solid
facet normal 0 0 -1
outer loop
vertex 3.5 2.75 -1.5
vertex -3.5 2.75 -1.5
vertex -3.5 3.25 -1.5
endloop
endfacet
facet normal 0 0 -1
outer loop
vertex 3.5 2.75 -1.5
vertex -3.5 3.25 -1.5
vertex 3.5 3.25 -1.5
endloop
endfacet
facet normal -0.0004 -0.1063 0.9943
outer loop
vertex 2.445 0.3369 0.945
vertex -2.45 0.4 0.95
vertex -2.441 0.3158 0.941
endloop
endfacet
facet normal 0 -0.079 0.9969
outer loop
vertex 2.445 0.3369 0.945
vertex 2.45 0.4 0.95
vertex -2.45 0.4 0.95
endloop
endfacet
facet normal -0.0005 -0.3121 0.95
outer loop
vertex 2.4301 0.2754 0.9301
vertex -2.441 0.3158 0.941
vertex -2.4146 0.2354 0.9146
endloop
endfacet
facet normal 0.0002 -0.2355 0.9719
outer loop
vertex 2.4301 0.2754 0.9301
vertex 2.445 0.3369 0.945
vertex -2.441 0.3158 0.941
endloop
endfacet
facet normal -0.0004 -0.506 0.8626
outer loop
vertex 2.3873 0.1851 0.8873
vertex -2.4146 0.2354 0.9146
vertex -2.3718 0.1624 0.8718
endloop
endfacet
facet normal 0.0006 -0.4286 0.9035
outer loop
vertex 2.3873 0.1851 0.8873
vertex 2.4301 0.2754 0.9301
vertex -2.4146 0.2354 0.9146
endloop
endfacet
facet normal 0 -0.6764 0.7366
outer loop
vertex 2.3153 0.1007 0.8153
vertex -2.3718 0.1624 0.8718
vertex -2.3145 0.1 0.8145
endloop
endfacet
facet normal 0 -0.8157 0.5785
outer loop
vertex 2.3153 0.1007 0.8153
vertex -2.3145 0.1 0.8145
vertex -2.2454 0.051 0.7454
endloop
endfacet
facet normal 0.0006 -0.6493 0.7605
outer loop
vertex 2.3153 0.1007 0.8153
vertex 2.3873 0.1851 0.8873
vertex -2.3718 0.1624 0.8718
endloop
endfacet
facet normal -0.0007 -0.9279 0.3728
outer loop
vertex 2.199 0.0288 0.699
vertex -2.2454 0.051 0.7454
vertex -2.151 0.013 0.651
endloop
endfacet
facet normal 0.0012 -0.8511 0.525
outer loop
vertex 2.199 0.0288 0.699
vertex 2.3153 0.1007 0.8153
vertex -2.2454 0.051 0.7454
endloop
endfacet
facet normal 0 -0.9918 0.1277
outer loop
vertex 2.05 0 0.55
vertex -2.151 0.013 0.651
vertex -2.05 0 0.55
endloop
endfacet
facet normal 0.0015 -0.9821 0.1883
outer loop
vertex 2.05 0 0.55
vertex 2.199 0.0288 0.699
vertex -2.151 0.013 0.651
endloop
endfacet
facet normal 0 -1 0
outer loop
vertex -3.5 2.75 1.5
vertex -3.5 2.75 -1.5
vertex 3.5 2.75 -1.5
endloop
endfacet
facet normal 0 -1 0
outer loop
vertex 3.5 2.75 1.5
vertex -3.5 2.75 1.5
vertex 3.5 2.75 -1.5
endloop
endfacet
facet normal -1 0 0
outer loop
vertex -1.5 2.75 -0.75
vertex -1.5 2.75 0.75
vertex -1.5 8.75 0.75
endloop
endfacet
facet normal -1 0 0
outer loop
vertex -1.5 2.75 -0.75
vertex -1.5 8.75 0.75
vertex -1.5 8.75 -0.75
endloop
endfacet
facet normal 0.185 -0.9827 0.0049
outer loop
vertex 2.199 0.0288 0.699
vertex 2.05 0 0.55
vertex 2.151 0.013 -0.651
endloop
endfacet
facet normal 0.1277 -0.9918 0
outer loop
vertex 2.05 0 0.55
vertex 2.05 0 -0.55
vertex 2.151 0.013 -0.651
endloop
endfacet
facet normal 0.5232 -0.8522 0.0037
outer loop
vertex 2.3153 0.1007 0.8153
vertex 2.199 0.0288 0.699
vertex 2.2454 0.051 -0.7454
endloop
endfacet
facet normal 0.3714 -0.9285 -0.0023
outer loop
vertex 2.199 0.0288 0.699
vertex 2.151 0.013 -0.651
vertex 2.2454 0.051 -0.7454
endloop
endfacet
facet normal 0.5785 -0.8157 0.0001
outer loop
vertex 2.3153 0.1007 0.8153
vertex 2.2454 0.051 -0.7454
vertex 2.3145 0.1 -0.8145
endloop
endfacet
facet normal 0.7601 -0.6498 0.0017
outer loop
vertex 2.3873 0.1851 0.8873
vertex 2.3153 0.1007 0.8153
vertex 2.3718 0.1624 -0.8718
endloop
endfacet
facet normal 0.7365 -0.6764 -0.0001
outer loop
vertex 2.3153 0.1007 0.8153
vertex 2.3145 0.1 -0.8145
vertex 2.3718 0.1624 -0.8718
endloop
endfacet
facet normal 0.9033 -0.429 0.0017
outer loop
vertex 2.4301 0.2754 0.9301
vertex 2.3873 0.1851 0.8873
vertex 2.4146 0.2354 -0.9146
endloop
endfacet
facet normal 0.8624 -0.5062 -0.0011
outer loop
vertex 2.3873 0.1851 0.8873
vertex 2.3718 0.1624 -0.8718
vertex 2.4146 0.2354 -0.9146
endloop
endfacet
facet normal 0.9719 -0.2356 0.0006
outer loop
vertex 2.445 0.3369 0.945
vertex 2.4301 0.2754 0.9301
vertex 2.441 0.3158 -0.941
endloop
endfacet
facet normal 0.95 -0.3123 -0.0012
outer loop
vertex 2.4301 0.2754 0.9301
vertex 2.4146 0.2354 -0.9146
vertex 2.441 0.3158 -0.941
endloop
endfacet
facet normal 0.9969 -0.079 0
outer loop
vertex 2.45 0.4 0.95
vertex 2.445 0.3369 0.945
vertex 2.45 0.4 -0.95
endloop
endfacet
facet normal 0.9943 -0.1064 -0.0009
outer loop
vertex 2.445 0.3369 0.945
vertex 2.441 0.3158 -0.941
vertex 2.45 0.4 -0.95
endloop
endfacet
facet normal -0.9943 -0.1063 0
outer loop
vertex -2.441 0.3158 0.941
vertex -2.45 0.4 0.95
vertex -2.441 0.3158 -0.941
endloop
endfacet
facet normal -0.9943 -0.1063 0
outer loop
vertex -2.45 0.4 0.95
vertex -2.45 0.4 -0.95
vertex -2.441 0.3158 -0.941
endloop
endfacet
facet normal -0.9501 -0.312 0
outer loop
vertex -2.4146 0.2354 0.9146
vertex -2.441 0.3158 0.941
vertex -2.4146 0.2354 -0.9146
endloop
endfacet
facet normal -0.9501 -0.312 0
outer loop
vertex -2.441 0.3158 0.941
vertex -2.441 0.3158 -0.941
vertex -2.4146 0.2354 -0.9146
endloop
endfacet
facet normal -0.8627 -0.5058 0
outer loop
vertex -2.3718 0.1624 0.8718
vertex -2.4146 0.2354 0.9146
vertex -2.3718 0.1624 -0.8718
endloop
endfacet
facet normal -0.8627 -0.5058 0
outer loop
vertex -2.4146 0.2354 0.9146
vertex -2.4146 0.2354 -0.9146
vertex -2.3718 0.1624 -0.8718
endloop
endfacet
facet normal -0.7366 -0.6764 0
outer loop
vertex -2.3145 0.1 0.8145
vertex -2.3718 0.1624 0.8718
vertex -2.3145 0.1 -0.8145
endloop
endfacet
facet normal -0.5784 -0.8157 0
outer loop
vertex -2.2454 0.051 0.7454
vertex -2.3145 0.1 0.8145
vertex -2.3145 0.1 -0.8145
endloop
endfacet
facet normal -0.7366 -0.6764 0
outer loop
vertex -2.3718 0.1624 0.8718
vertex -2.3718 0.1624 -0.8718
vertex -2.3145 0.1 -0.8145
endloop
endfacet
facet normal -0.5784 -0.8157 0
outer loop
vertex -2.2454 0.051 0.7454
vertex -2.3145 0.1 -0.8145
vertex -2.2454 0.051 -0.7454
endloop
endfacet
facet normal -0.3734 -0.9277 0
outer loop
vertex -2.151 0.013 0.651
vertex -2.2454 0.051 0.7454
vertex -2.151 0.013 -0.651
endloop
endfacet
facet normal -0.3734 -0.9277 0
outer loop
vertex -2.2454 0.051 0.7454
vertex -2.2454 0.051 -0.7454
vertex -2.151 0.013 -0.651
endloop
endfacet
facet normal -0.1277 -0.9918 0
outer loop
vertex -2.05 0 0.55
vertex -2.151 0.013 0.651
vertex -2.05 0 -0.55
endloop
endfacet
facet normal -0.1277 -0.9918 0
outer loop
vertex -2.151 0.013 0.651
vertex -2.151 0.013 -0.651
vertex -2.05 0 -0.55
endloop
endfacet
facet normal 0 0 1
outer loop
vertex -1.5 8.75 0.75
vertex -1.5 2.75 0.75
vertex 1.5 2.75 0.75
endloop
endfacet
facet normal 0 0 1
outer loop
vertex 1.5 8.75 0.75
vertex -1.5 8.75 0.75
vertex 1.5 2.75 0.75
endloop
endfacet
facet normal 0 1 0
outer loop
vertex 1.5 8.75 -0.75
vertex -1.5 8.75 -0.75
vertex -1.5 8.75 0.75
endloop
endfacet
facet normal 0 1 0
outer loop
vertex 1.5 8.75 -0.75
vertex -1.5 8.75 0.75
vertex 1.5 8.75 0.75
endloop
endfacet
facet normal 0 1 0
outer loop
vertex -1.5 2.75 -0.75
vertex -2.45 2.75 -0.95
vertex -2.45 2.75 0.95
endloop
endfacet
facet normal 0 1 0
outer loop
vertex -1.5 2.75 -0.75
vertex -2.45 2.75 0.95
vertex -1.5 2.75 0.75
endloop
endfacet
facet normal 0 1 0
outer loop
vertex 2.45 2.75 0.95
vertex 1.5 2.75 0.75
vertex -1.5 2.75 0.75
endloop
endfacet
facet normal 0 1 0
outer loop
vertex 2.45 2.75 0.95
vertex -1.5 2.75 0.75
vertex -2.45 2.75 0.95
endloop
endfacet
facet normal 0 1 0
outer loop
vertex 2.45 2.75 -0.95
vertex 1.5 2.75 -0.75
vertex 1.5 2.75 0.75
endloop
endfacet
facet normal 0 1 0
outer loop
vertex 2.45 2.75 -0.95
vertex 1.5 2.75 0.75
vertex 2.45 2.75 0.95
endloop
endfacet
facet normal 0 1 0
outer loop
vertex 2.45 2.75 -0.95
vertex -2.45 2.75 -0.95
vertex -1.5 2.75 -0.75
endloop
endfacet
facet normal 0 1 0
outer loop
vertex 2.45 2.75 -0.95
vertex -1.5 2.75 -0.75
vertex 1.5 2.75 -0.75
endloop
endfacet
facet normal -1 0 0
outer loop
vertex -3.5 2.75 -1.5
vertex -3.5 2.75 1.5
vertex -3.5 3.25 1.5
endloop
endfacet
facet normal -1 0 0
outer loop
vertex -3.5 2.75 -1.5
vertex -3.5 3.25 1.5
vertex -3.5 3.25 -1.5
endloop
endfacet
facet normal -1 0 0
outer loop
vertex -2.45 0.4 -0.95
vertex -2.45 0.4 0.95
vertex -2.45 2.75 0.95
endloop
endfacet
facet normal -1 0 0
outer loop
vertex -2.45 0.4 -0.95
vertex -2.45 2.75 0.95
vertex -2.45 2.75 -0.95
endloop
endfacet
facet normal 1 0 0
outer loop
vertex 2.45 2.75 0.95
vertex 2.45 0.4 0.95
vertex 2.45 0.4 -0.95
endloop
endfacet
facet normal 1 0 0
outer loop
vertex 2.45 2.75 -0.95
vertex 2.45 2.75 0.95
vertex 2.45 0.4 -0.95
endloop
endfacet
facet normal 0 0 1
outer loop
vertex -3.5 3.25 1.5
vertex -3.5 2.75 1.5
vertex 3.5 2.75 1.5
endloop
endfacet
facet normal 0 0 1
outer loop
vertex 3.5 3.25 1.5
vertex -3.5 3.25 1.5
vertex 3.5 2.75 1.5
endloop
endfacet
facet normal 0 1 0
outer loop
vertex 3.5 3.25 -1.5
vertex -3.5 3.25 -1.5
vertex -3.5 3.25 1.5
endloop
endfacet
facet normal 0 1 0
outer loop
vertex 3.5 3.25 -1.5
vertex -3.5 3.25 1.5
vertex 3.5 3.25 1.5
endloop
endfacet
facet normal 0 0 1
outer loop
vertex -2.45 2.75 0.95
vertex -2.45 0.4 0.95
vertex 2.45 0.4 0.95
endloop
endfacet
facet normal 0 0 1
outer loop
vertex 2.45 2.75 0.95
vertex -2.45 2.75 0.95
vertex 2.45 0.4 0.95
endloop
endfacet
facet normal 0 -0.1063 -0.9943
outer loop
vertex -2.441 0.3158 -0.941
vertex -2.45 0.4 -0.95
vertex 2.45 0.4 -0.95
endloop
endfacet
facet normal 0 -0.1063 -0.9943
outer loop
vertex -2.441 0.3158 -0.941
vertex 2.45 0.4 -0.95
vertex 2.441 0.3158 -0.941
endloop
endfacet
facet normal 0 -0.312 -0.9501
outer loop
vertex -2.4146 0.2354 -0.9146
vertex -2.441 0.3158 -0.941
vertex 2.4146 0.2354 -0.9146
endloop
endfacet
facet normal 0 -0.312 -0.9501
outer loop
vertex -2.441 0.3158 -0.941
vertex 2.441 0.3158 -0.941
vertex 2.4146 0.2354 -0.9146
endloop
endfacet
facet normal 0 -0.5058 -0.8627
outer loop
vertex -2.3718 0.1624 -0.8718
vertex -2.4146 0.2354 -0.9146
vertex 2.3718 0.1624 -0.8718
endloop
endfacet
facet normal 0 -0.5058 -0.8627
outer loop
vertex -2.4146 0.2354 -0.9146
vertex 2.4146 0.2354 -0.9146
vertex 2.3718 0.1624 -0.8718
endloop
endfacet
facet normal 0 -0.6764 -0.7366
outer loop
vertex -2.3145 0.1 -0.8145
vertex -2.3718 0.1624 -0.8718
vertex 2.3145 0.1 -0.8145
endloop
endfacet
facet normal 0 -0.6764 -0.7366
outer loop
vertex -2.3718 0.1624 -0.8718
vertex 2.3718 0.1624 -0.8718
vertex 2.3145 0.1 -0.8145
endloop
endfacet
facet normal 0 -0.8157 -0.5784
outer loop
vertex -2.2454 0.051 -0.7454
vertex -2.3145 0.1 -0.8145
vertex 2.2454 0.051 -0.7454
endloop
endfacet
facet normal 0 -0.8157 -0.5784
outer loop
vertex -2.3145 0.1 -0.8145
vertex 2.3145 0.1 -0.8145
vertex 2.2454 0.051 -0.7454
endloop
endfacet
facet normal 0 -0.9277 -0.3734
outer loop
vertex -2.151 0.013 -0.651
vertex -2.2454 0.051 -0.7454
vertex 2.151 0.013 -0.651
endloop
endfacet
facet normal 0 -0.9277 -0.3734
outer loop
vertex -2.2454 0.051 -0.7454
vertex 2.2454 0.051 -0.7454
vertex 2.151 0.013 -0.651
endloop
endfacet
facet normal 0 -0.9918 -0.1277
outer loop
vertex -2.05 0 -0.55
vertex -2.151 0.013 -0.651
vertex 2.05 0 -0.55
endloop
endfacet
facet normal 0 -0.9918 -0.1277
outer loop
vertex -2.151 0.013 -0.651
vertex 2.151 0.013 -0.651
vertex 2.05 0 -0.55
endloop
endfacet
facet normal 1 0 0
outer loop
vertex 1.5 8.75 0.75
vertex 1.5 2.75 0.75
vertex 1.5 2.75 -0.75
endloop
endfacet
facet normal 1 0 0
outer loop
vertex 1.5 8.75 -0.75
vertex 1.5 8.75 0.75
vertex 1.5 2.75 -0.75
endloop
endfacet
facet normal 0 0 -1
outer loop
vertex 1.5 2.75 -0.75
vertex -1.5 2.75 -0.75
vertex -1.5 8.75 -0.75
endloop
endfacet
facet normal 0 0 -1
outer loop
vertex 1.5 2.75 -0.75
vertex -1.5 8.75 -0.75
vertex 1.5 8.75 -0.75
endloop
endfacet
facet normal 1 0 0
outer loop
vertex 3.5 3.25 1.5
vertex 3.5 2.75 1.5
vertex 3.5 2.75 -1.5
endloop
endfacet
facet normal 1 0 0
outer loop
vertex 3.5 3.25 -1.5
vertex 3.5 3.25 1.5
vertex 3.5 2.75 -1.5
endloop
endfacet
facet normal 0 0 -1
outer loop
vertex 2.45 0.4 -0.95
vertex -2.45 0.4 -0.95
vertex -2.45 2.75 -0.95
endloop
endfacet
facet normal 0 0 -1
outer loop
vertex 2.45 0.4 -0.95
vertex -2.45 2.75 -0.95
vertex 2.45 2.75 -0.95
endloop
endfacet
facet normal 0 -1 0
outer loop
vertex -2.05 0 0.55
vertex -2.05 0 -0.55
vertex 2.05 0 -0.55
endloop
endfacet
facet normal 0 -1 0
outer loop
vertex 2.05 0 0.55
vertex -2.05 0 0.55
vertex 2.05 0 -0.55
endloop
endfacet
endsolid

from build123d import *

# Parameters (mm, degrees)
SKETCH1_W           = 4.9
SKETCH1_H           = 1.9
BOSS_EXTRUDE1_DEPTH = 2.75
SKETCH2_W           = 3
SKETCH2_H           = 1.5
BOSS_EXTRUDE2_DEPTH = 6
FILLET2_R           = 0.4
SKETCH3_W           = 7
SKETCH3_H           = 3
BOSS_EXTRUDE3_DEPTH = 0.5


with BuildPart() as part:
    # Sketch1 → Boss-Extrude1 (new body)
    with BuildSketch(Plane(origin=(0, 0, 0), x_dir=(1, 0, 0), z_dir=(0, 1, 0))):
        Rectangle(SKETCH1_W, SKETCH1_H)
    extrude(amount=BOSS_EXTRUDE1_DEPTH)

    # Sketch2 → Boss-Extrude2 (add)
    with BuildSketch(Plane(origin=(0, 2.75, 0), x_dir=(1, 0, 0), z_dir=(0, 1, 0))):
        Rectangle(SKETCH2_W, SKETCH2_H)
    extrude(amount=BOSS_EXTRUDE2_DEPTH)

    # Fillet2
    fillet2_edges = [part.edges().sort_by_distance(p)[0] for p in [
        (0, 0, -0.95),
        (2.45, 0, 0),
        (0, 0, 0.95),
        (-2.45, 0, 0),
    ]]
    fillet(fillet2_edges, radius=FILLET2_R)


with BuildPart() as body_2:
    # Sketch3 → Boss-Extrude3 (new body)
    with BuildSketch(Plane(origin=(0, 2.75, 0), x_dir=(1, 0, 0), z_dir=(0, 1, 0))):
        Rectangle(SKETCH3_W, SKETCH3_H)
    extrude(amount=BOSS_EXTRUDE3_DEPTH)


solid = Compound([part.part, body_2.part])
